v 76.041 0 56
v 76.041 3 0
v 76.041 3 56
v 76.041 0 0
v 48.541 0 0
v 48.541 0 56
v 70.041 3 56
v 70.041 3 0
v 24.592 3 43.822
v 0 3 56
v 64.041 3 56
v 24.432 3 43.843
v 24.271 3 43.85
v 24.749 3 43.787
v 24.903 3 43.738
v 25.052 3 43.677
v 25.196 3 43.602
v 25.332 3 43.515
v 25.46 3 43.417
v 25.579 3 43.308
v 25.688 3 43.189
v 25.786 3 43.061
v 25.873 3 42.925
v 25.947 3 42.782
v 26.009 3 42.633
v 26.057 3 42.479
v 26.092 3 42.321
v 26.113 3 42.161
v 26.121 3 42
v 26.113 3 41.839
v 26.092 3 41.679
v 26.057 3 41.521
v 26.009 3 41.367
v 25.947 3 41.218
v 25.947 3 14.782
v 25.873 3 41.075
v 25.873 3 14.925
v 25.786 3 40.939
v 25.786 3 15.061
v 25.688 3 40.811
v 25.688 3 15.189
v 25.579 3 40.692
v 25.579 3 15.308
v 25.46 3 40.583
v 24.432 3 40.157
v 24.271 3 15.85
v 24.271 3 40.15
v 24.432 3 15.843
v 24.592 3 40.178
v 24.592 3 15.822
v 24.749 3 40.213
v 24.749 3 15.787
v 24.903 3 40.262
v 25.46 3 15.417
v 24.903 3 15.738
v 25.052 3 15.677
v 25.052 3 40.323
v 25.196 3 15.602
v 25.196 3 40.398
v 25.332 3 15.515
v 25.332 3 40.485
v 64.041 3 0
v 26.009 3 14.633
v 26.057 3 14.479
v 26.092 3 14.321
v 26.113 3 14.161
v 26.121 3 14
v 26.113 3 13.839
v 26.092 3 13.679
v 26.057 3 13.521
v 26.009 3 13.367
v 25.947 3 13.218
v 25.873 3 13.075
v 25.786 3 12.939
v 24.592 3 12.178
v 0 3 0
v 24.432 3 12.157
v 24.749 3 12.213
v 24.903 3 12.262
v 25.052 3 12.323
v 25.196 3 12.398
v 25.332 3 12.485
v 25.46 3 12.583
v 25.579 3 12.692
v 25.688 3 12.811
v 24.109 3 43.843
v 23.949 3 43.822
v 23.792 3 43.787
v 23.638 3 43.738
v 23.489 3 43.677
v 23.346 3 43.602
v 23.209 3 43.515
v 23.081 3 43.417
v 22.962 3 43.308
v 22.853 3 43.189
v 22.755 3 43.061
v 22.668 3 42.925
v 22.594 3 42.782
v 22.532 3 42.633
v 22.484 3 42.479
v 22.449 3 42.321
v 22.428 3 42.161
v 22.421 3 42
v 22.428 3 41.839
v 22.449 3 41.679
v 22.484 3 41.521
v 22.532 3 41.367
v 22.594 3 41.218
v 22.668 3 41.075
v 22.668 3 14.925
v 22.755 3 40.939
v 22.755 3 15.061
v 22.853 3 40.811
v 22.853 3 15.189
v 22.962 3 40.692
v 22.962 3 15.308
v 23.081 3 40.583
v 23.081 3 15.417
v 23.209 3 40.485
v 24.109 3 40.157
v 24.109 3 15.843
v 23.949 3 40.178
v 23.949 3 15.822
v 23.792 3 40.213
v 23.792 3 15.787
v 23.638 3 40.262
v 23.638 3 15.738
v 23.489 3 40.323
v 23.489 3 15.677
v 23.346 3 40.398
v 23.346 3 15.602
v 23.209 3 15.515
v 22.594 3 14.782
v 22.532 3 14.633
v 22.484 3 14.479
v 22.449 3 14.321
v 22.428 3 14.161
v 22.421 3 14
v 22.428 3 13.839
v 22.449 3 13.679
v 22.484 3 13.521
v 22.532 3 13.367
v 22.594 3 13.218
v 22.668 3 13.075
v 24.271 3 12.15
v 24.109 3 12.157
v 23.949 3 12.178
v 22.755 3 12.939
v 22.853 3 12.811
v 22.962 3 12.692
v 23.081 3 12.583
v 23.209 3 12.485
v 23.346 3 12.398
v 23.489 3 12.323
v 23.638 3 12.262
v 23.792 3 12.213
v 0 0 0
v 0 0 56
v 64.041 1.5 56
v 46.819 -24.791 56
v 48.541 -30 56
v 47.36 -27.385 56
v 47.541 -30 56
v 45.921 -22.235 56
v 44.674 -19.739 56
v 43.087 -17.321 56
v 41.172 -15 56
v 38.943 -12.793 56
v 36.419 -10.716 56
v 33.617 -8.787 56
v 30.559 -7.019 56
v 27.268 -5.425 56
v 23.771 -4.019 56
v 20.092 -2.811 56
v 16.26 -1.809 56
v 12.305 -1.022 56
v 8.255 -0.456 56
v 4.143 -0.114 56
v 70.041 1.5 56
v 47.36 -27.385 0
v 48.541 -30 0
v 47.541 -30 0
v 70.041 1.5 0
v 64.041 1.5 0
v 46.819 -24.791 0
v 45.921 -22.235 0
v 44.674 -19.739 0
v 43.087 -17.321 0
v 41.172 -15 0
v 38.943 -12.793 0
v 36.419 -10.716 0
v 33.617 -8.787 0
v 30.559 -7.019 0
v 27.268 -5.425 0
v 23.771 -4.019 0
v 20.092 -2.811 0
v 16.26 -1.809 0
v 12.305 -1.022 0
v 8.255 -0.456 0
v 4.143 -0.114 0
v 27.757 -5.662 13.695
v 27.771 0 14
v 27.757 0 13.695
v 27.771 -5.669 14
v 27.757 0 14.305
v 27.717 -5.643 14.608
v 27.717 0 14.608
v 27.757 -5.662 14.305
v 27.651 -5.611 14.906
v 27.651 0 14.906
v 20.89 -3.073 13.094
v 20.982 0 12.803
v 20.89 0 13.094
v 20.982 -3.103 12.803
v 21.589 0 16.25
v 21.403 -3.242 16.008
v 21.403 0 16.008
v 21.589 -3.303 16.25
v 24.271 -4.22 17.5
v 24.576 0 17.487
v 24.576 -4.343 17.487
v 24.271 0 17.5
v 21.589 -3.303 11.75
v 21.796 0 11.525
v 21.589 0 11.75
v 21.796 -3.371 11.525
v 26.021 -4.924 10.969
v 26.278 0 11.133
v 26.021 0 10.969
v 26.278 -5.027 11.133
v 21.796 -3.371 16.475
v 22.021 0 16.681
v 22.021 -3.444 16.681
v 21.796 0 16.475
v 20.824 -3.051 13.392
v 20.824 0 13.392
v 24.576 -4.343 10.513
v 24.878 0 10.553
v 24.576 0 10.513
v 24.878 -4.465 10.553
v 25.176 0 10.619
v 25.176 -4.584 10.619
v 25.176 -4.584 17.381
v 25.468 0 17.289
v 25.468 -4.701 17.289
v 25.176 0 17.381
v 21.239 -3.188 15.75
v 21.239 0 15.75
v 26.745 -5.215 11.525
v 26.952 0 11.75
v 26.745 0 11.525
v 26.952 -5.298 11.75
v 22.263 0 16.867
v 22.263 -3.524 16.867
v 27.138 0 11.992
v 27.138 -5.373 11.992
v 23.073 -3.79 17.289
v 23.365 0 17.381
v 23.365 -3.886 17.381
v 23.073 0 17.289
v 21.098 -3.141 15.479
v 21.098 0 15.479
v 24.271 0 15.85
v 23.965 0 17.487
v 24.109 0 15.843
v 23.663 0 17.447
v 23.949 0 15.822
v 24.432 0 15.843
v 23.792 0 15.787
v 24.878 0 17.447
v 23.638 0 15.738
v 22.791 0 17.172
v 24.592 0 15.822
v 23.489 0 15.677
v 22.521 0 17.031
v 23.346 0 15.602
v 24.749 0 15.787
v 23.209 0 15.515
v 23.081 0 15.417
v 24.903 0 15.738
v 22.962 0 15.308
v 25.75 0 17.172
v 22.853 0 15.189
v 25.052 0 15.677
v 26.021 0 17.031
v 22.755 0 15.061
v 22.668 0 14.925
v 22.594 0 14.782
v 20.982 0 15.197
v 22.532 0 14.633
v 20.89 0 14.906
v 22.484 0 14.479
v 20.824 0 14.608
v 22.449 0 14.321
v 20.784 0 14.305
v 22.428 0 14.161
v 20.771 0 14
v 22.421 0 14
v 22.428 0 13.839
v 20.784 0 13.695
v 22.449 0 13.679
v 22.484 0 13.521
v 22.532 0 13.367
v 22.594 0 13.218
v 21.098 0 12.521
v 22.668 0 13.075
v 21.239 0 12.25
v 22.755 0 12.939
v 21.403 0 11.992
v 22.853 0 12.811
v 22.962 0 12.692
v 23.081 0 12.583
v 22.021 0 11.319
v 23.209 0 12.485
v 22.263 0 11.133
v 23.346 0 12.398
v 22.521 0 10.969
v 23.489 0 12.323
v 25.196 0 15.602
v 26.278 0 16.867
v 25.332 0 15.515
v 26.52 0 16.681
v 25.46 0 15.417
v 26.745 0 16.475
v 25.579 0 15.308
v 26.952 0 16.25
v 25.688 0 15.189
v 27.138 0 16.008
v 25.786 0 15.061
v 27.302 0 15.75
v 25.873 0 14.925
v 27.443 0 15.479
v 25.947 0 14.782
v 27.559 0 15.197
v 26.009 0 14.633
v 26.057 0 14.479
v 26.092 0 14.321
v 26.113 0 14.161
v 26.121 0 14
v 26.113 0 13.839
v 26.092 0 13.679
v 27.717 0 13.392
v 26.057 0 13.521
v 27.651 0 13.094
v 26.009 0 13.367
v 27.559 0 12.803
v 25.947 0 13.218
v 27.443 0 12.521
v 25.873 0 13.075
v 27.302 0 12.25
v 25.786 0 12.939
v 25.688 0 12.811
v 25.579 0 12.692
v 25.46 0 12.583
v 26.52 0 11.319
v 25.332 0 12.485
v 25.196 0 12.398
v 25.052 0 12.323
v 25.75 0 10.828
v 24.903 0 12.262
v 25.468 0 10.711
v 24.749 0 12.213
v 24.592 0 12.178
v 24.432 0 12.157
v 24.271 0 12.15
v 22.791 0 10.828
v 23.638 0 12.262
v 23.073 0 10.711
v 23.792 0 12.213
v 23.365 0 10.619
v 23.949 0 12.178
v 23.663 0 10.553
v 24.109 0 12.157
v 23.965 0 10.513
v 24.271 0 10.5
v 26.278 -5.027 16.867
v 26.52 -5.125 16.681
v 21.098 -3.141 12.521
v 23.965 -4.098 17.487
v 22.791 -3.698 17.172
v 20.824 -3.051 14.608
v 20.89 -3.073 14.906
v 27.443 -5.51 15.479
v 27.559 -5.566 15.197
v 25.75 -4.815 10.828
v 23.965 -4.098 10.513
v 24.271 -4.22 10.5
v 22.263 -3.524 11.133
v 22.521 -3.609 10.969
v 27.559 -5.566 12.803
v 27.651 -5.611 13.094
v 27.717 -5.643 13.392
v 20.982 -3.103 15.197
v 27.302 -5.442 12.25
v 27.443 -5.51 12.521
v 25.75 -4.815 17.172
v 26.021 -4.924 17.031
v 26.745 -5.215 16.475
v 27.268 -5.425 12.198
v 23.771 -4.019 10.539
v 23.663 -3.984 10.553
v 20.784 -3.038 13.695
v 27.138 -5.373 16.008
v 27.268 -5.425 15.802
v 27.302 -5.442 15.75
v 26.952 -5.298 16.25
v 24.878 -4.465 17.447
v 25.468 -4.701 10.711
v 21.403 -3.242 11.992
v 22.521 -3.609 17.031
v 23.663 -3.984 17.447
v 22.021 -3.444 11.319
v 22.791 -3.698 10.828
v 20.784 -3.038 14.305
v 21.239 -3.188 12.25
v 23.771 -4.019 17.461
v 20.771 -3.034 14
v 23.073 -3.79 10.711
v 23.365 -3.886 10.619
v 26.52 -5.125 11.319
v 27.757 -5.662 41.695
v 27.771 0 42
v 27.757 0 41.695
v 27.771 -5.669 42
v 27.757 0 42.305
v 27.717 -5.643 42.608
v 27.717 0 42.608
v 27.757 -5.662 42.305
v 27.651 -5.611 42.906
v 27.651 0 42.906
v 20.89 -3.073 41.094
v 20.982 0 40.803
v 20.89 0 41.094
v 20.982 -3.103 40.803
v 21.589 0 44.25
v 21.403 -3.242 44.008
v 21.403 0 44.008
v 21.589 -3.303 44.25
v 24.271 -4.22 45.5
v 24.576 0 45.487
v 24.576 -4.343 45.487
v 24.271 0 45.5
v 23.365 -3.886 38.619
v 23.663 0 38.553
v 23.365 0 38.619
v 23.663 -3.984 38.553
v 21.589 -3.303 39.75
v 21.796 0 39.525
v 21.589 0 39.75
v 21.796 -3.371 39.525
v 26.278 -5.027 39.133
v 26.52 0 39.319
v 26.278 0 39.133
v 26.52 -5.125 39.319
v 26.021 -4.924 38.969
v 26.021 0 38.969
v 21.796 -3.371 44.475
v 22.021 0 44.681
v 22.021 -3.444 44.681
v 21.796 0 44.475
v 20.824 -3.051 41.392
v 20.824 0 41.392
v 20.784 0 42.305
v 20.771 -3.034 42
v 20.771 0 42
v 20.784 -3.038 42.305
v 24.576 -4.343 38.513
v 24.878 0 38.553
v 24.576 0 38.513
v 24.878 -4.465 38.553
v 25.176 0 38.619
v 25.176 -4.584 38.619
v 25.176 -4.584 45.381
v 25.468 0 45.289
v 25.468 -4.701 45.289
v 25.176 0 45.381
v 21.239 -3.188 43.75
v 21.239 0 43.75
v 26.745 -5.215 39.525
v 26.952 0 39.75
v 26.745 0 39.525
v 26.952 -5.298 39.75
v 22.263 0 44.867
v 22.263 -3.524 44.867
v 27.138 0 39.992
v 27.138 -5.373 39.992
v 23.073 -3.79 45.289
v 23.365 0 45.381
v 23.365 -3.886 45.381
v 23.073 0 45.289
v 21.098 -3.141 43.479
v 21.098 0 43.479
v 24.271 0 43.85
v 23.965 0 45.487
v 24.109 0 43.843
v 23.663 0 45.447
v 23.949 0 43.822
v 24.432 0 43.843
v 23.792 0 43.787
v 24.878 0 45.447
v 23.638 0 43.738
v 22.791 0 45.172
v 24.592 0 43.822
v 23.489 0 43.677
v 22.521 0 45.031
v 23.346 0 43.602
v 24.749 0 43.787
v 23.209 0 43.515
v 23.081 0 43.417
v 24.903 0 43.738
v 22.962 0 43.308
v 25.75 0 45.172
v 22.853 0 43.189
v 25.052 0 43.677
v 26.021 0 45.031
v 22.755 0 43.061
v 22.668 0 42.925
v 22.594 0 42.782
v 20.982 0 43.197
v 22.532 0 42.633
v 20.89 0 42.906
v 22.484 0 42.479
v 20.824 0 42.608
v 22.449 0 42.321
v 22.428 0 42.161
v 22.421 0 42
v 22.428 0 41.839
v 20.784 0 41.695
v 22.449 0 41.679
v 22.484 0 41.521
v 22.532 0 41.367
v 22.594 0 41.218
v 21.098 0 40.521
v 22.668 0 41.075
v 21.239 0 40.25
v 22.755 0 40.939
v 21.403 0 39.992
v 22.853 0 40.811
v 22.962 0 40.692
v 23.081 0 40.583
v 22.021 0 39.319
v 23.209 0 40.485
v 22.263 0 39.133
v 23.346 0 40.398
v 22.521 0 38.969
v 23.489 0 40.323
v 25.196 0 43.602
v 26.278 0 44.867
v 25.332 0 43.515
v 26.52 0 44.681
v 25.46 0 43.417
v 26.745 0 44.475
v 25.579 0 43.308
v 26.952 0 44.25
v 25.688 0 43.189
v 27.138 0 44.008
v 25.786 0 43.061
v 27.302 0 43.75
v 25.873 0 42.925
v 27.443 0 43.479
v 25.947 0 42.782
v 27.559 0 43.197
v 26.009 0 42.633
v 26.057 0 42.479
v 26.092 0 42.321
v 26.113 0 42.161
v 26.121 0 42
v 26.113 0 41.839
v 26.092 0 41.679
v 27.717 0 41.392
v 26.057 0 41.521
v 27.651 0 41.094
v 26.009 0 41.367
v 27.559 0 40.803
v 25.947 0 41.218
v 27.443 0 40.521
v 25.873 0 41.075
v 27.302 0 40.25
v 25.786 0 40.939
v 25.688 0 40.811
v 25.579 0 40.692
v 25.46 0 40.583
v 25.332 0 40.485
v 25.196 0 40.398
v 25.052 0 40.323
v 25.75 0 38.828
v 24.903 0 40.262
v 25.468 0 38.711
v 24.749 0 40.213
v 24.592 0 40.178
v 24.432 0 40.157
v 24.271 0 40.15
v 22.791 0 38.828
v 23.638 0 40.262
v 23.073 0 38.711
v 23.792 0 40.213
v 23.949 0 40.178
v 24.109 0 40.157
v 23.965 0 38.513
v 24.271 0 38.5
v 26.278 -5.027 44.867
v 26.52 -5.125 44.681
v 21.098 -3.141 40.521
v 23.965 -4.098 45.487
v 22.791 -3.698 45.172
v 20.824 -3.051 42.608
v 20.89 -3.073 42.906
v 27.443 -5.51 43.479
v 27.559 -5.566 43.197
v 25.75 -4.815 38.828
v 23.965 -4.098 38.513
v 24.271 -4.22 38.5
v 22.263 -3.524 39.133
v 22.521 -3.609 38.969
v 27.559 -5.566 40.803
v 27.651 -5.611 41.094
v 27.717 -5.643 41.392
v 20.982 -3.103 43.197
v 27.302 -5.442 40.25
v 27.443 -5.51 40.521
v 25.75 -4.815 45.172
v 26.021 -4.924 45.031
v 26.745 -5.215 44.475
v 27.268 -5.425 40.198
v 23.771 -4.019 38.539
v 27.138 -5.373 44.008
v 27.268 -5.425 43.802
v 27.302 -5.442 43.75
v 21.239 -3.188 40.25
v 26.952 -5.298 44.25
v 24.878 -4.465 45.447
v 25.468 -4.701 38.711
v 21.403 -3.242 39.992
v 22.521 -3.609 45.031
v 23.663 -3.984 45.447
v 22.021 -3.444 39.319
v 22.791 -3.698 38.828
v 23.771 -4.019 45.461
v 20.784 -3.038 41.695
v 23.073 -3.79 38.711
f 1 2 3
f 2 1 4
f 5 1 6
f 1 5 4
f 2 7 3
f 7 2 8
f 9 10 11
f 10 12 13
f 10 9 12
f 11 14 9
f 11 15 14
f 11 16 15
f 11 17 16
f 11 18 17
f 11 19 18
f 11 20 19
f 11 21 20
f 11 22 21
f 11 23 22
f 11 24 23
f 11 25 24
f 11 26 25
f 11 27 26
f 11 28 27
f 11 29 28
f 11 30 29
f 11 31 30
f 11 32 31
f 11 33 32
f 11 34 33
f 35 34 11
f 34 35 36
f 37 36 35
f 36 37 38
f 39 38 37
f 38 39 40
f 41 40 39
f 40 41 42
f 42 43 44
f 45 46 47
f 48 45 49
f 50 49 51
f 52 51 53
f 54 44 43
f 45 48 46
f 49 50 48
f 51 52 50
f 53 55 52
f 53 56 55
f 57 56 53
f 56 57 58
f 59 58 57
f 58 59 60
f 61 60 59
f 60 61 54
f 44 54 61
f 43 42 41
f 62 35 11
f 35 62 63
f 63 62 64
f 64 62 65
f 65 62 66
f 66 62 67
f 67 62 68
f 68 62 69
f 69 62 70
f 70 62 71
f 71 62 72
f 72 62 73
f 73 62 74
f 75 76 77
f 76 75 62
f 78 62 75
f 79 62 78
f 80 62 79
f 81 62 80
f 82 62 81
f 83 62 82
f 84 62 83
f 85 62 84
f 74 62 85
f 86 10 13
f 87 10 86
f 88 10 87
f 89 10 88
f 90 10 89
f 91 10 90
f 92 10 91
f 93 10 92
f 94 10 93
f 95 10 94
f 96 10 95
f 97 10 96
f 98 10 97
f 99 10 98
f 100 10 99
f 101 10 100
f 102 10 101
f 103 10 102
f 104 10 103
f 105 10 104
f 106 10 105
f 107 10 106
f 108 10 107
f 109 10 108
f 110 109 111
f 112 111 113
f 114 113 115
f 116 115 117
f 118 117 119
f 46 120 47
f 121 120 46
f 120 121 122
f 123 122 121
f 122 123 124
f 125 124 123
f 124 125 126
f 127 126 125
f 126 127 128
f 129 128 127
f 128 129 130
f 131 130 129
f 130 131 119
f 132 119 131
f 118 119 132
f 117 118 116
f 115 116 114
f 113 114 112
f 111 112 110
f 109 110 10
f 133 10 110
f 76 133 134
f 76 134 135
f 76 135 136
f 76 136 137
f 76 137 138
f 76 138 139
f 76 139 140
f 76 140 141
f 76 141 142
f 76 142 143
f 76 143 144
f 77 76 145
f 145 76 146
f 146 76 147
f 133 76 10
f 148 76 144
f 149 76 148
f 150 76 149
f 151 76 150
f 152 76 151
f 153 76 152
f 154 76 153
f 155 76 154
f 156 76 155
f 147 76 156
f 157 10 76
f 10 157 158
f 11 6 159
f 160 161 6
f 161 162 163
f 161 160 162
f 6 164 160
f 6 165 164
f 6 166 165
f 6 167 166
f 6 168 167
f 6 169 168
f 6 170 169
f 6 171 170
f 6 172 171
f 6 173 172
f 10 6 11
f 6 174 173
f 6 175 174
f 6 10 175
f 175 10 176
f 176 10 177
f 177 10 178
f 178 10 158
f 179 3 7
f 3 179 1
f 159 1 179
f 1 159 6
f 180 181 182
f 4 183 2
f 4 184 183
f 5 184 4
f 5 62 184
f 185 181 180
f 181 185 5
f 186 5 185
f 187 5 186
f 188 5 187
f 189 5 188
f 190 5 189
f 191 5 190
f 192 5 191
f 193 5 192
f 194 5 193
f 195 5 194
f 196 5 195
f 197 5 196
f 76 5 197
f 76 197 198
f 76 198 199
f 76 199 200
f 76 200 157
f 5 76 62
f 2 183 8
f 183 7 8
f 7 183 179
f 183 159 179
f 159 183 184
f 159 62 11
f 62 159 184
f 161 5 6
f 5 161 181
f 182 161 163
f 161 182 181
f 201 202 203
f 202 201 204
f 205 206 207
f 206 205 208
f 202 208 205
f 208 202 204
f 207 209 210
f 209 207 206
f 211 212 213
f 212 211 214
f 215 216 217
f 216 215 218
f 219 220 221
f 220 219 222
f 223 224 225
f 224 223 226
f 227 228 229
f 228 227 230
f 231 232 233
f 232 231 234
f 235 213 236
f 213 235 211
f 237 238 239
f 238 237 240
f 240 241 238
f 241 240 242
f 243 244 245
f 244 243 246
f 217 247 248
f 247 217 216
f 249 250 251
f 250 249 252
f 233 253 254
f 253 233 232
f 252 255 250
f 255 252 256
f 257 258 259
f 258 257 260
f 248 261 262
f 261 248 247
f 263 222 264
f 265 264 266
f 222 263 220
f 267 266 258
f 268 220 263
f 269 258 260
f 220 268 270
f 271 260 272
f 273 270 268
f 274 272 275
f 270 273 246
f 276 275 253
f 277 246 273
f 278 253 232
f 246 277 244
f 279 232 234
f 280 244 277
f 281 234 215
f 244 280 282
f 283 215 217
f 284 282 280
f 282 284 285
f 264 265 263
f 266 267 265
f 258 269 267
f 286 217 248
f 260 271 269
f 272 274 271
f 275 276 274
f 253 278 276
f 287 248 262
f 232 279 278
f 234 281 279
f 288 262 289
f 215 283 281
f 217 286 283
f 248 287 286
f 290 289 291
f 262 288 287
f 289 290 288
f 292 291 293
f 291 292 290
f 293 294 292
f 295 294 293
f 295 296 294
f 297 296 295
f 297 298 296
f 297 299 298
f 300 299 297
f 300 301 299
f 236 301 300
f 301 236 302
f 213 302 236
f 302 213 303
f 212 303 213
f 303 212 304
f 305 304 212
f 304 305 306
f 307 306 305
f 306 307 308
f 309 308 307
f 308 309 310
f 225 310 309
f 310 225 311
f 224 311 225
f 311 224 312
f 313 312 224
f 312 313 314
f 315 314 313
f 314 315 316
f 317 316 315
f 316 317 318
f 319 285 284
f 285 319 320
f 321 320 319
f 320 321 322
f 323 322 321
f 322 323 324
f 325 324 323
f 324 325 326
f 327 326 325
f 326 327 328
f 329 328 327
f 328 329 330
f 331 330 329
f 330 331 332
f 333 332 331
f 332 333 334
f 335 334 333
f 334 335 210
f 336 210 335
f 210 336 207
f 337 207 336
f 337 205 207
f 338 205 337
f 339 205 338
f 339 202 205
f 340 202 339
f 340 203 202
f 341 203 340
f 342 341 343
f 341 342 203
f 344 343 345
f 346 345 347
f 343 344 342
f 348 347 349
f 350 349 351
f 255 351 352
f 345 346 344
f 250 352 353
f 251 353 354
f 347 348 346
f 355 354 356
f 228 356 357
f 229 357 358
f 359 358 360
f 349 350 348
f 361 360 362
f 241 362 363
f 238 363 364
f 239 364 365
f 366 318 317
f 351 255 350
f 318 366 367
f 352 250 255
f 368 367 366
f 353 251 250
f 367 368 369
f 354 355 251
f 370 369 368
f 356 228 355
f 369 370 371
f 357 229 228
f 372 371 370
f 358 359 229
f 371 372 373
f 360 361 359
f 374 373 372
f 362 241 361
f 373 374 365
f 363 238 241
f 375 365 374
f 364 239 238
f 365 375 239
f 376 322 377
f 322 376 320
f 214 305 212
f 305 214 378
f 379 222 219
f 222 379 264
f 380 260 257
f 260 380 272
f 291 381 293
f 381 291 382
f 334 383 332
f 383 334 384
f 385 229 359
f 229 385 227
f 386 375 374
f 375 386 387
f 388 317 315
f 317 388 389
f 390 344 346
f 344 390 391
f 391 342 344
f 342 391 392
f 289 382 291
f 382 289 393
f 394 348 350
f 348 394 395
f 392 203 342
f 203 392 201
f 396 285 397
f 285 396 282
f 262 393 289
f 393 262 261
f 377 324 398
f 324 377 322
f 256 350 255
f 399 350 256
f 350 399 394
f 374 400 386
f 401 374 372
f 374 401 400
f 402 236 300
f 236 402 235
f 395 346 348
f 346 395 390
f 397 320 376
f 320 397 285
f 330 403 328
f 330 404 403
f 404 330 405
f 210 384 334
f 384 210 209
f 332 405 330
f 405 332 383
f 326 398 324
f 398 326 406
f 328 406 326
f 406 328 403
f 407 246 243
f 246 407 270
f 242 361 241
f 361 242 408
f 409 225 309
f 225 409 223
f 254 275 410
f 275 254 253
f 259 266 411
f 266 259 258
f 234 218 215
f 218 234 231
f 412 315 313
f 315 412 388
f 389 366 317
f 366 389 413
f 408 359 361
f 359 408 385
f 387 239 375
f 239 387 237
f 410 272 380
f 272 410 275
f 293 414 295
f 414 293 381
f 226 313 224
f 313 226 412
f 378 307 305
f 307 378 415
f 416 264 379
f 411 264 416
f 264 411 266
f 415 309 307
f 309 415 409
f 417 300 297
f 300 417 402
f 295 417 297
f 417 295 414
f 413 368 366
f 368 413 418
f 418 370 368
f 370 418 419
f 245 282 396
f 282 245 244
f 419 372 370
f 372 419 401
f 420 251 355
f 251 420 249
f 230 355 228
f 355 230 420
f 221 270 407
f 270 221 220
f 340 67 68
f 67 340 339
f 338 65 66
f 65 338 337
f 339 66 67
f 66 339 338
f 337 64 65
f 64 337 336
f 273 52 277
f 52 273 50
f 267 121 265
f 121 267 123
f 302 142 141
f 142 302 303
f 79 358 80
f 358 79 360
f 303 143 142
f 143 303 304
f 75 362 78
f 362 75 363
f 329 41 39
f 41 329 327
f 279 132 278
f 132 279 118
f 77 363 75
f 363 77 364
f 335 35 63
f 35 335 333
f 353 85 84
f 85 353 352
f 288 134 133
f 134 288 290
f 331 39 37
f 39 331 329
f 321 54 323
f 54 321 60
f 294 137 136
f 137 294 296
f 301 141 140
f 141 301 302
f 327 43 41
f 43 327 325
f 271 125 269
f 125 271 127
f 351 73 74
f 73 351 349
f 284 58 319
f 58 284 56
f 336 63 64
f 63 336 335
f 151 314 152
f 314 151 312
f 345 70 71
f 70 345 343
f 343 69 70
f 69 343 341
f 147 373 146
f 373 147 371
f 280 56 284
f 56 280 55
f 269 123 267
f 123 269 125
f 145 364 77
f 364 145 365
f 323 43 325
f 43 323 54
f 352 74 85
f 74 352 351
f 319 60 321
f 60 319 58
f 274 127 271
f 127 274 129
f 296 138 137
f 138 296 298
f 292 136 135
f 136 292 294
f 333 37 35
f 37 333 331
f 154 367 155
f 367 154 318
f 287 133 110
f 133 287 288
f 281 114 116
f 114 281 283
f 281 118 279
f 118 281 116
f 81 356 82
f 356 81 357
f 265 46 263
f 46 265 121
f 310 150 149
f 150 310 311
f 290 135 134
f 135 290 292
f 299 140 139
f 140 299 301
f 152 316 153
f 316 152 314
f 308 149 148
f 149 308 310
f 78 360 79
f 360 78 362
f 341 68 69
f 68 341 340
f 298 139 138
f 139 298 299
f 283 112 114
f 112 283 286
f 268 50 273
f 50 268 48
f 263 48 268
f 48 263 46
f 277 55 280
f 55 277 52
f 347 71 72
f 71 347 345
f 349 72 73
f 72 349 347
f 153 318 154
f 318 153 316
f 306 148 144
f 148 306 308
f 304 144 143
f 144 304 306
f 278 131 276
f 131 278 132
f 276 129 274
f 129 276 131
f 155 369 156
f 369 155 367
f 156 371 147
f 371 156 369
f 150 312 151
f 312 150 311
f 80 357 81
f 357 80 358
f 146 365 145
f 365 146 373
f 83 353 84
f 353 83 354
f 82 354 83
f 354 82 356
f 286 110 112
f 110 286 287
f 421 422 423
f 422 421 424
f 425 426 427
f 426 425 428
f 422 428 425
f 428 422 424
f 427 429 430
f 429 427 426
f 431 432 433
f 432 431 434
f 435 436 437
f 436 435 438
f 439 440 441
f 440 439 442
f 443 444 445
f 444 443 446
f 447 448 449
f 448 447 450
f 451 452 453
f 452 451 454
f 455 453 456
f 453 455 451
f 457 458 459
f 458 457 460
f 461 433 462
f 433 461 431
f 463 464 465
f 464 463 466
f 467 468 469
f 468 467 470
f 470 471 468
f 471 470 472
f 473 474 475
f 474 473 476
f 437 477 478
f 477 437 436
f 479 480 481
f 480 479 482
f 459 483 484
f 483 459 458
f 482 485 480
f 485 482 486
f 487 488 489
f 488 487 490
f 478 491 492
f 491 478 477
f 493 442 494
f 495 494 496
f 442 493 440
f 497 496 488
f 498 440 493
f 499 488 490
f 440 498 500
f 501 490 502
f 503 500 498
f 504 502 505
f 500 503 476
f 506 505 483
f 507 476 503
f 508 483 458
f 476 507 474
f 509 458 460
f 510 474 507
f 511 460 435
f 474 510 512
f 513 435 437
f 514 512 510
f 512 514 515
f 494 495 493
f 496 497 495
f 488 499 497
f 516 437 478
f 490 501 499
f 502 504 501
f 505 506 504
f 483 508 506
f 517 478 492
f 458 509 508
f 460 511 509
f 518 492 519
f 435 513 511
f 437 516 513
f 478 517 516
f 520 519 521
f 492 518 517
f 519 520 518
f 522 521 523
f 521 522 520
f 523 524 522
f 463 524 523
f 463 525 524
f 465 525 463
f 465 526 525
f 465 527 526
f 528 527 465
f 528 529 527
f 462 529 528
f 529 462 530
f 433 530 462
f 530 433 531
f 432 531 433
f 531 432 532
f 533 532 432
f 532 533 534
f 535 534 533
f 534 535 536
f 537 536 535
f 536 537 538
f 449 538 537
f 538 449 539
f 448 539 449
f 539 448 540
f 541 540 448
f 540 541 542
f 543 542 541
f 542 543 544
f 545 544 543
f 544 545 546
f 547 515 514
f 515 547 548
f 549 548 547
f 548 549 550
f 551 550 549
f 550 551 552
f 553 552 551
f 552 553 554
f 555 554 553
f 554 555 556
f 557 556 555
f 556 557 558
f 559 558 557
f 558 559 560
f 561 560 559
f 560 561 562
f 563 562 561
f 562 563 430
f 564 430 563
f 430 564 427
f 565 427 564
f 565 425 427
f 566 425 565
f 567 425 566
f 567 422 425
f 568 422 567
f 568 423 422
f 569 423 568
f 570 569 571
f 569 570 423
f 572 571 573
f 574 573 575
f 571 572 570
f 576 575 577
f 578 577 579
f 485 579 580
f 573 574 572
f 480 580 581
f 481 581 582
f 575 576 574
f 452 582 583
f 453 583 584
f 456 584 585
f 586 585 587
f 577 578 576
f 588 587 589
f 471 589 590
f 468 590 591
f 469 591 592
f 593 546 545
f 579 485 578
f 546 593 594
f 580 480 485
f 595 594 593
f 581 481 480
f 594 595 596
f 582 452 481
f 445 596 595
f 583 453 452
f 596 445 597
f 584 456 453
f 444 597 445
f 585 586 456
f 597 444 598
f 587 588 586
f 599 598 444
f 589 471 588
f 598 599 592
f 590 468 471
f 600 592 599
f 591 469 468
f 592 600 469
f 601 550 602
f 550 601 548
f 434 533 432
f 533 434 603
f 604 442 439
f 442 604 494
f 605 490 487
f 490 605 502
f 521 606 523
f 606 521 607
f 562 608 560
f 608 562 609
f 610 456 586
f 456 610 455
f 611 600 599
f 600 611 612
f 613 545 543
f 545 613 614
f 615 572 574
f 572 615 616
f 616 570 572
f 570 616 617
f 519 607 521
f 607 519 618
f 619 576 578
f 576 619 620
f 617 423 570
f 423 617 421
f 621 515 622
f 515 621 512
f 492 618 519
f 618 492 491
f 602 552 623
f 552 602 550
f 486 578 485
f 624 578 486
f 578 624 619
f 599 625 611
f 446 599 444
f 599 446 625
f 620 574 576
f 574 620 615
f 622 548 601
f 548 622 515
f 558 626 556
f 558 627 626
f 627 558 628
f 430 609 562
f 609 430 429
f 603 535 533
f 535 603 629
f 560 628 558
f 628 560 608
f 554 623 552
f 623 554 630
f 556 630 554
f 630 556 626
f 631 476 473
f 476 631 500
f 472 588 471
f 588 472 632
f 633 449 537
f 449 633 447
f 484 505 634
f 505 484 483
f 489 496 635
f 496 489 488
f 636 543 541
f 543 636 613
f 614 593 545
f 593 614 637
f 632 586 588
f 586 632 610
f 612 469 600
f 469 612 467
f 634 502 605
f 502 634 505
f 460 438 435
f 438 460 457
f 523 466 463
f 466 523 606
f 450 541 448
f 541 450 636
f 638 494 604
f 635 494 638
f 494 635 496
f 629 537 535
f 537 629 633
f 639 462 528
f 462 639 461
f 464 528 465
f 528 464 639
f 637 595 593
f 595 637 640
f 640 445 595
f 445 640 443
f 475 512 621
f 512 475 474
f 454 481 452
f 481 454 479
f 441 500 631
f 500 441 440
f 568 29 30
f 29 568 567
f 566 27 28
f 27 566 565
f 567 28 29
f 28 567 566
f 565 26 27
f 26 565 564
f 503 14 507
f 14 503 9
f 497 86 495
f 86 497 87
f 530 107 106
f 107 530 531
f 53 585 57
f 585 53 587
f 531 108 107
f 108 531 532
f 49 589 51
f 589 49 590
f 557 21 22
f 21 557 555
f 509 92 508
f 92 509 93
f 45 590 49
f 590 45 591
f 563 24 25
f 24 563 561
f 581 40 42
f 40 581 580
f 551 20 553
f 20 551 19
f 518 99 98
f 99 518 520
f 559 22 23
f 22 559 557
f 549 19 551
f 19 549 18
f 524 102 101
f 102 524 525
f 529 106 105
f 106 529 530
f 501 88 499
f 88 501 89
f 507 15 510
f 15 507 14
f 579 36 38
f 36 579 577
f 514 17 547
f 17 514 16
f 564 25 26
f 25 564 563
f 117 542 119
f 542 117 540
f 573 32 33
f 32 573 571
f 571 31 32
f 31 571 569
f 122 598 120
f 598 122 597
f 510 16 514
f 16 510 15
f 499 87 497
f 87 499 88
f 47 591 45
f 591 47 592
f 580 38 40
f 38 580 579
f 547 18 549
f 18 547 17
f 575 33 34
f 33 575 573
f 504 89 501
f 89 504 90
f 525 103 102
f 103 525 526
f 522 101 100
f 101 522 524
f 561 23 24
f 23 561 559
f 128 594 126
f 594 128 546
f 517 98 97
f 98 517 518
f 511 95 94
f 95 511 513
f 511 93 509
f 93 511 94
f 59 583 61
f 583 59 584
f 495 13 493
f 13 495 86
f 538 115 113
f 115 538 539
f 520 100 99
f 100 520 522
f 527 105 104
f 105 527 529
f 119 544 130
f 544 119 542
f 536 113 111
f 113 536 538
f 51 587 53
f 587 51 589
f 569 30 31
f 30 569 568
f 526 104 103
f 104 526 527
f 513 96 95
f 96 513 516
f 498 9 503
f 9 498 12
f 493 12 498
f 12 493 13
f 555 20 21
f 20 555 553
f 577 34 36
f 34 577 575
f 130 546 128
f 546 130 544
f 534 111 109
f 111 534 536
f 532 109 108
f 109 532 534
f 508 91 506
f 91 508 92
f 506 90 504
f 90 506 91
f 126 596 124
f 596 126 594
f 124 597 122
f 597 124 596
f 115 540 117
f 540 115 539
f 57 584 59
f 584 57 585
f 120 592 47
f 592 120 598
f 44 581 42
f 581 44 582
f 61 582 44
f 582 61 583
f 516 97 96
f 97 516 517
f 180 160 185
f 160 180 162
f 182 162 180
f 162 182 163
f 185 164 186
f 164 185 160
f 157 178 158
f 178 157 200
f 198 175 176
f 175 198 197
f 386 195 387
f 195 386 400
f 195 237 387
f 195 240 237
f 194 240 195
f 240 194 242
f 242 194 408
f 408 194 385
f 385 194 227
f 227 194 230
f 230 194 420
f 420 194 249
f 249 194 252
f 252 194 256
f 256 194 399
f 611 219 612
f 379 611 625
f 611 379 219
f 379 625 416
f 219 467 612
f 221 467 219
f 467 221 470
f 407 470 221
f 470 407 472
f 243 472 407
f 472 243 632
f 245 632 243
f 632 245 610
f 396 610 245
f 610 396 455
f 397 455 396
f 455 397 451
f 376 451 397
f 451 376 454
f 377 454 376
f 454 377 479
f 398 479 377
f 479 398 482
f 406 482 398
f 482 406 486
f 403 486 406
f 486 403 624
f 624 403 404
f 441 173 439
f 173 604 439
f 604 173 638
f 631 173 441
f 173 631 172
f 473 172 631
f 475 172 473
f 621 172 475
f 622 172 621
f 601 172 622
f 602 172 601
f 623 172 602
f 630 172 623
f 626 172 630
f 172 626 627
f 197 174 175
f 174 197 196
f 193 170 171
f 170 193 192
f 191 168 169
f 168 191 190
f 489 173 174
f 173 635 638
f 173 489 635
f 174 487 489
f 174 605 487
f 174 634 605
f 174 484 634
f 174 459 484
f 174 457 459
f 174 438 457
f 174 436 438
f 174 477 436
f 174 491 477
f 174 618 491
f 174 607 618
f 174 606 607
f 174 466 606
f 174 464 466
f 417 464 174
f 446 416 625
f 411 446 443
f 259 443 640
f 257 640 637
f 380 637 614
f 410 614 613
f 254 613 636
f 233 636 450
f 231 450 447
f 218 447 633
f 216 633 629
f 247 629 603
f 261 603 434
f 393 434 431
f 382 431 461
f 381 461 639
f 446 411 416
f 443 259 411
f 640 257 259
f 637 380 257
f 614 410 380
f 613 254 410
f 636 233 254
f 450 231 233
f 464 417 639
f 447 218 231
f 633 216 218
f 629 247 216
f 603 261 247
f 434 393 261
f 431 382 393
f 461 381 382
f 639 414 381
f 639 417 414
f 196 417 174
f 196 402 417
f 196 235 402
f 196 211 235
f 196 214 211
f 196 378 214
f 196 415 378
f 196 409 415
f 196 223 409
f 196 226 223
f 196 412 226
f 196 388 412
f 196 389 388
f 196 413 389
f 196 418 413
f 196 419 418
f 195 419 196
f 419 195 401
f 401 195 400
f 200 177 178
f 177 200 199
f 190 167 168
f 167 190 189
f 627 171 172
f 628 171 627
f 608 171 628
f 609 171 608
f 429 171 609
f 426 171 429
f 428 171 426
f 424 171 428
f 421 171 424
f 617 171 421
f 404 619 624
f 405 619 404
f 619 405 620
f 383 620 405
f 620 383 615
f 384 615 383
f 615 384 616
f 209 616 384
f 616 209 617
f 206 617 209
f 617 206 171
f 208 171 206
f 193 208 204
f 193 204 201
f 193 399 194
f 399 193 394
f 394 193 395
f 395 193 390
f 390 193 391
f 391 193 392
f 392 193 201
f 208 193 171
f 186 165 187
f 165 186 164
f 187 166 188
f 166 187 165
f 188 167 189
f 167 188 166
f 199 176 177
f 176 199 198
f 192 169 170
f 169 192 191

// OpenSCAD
/*
 * Copyright ©2015 Laurence Gonsalves <laurence@xenomachina.com>
 *
 * This library is free software; you can redistribute it and/or
 * modify it under the terms of the GNU Lesser General Public
 * License as published by the Free Software Foundation; either
 * version 2.1 of the License, or any later version.
 *
 * This library is distributed in the hope that it will be useful,
 * but WITHOUT ANY WARRANTY; without even the implied warranty of
 * MERCHANTABILITY or FITNESS FOR A PARTICULAR PURPOSE.  See the GNU
 * Lesser General Public License for more details.
 *
 * You should have received a copy of the GNU Lesser General Public
 * License along with this library; if not, write to:
 *   Free Software Foundation, Inc.
 *   51 Franklin Street, Fifth Floor
 *   Boston, MA  02110-1301
 *   USA
 */


$fn = 72;
epsilon = 0.001;

depth = 56;
height = 30;
phi = (1 + sqrt(5)) / 2;
width = height * phi;
zip_tie_width = 6;
zip_tie_thickness = 1.5;
bottom_thickness = 3; // must be > zip_tie_thickness
zip_tie_offset = 15.5;
screw_head_r=7/2;
screw_shaft_r=3.7/2;

module main() {
    // The device bracket will rest on.
    %translate([width,0,0]) cube([12*254, depth, height]);

    difference() {
        union() {
            // "Side" bracket
            cube([width, depth, height]);

            // "Bottom" with zip tie slot
            translate([0,0,-bottom_thickness]) 
            difference(){
                cube([width + zip_tie_offset + 2*zip_tie_width, depth, bottom_thickness]);
                translate([width + zip_tie_offset,0,0])
                    cube([zip_tie_width, depth, zip_tie_thickness]);
            }
        }

        union() {
            // Arc cut-out
            translate([0,0,height])
                scale([width - 1, depth + epsilon, height])
                rotate([270,0,0])
                cylinder(r=1,h=1);

            // Screw holes
            for(i=[1,3]){
                translate([width/2, depth/4 * i, 0]) {
                    // screw head
                    cylinder(r=screw_head_r, h=height);
                    // screw shaft
                    translate([0,0,-bottom_thickness]) cylinder(r=screw_shaft_r, h=height);
                }
            }
        }
    }

}

rotate([90,0,0]) main();
